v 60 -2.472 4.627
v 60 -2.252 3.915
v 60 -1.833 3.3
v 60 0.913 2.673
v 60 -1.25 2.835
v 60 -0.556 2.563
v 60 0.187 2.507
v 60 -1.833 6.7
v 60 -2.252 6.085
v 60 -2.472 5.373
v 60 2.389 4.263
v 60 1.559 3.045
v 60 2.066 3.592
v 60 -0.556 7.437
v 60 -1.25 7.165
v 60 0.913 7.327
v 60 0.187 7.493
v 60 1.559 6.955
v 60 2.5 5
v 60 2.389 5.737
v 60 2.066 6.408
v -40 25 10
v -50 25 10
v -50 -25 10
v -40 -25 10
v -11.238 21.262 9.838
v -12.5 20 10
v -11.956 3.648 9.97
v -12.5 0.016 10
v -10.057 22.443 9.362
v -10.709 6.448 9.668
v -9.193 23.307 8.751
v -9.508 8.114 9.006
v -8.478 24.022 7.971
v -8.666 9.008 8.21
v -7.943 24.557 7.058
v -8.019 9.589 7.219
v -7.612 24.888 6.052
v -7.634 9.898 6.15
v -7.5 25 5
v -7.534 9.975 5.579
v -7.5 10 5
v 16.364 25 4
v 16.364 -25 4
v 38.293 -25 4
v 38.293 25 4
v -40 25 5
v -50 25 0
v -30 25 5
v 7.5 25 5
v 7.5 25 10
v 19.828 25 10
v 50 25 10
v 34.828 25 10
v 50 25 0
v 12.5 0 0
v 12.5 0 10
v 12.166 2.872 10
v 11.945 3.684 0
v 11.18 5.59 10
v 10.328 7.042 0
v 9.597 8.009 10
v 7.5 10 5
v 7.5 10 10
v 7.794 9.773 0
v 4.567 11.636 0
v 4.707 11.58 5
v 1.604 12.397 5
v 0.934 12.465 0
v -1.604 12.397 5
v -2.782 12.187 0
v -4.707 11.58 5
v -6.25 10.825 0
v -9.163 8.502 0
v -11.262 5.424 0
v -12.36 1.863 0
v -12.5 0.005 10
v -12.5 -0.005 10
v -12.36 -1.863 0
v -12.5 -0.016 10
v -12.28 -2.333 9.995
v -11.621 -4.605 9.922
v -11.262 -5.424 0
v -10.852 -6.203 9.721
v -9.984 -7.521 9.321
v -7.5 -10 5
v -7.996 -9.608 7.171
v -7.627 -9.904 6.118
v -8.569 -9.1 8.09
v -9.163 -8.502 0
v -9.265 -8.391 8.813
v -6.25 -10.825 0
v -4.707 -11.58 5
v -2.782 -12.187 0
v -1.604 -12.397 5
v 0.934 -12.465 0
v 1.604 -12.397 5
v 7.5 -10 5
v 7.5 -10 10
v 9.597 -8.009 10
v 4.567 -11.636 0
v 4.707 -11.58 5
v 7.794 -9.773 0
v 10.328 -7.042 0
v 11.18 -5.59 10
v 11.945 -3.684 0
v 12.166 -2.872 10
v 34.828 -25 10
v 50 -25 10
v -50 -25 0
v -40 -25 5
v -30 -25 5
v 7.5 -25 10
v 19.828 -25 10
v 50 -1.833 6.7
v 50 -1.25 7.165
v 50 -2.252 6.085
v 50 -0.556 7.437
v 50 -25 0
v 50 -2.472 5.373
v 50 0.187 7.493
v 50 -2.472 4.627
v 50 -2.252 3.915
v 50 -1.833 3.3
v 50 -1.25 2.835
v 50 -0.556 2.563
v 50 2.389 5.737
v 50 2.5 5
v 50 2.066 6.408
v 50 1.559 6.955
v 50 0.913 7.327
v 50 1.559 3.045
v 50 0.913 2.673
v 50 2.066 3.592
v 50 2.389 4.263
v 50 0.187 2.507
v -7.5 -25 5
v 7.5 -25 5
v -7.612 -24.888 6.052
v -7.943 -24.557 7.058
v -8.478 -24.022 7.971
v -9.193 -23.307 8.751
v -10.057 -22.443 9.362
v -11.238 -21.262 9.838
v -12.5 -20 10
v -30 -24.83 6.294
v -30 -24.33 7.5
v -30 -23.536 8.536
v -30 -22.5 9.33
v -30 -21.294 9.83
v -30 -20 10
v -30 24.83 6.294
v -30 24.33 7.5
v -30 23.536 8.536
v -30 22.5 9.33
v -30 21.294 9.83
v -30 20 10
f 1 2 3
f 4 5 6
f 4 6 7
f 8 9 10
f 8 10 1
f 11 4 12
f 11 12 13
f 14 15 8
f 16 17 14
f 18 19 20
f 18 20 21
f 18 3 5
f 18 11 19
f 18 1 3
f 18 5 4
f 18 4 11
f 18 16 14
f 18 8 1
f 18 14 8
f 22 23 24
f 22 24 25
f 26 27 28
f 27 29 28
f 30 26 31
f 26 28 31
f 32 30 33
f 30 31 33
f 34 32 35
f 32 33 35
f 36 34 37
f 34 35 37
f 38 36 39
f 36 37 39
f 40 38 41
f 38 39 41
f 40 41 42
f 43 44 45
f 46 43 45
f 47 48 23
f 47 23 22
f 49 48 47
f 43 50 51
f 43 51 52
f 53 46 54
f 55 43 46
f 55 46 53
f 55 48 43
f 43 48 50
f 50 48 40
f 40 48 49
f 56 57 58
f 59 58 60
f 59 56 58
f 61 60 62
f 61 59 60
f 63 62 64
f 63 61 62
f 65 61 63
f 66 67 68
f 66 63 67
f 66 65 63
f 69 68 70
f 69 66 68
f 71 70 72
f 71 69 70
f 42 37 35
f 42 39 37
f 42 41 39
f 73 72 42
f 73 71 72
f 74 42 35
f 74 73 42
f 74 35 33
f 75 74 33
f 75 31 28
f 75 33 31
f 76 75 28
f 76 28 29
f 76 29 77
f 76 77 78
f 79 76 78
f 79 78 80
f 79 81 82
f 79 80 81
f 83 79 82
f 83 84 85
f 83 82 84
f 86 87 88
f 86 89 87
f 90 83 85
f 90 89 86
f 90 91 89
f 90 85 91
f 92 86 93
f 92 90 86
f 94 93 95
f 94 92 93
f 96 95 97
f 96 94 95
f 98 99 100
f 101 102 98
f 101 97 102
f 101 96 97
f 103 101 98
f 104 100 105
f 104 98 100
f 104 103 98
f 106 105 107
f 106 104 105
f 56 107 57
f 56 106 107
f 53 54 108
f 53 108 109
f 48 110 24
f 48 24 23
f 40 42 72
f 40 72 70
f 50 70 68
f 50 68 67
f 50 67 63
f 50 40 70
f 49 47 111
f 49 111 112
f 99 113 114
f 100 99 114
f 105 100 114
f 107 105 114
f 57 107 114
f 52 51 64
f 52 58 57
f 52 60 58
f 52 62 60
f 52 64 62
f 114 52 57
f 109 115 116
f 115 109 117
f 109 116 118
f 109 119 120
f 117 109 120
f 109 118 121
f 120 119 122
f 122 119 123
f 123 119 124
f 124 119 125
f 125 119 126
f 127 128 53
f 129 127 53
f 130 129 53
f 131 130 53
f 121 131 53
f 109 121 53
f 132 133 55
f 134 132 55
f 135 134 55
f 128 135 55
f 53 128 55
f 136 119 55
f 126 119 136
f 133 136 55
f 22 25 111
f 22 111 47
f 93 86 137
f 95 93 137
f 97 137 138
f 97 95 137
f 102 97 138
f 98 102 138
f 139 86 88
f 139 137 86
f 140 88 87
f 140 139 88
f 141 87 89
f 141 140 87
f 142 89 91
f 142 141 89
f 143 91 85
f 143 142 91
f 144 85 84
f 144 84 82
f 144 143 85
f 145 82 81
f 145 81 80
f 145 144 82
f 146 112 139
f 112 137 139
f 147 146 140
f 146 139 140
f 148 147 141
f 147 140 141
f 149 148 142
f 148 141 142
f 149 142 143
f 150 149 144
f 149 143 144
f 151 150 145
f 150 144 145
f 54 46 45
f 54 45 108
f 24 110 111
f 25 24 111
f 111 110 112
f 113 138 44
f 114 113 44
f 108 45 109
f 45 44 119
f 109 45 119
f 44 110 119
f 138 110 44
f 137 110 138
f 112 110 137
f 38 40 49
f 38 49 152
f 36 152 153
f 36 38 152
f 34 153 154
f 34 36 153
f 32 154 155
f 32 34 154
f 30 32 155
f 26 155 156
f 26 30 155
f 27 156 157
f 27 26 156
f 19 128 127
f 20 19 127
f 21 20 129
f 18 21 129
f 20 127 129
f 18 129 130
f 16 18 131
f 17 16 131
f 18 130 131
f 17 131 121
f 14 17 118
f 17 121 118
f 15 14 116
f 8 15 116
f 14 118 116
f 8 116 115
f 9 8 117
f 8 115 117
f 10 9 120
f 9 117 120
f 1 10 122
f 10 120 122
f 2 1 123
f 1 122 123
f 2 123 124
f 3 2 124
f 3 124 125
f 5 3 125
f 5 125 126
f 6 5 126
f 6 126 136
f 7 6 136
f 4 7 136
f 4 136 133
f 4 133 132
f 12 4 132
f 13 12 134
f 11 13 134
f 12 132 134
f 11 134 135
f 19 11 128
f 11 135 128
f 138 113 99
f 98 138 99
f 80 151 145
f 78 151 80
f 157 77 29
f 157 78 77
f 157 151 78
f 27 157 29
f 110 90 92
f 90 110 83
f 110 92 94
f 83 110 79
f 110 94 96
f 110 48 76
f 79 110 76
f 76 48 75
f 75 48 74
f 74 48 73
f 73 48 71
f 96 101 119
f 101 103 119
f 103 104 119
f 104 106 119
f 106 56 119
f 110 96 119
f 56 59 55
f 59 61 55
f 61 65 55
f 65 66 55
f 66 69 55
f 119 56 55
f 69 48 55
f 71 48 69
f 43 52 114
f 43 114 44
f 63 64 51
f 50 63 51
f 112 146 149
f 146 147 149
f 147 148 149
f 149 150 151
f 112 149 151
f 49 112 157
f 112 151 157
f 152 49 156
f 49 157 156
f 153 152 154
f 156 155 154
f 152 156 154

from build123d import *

# Parameters (mm, degrees)
F0_W     = 100
F0_H     = 50
F0_R     = 12.5
F1_DEPTH = 10
F2_W     = 10
F2_H     = 50
F3_DEPTH = 5
F5_DEPTH = 50.001
F6_R     = 2.5
F7_DEPTH = 10
F8_R     = 4.99999


# Not quite as in the source:
# - a fillet or chamfer is up to 0.001 mm smaller than in the source, because OpenCascade refuses the exact size


with BuildPart() as f1:
    # F0 (on Top) → F1 (new body)
    with BuildSketch(Plane.XY):
        Rectangle(F0_W, F0_H)
        Circle(F0_R, mode=Mode.SUBTRACT)
    extrude(amount=F1_DEPTH)

    # F2 (on face) → F3 (cut)
    with BuildSketch(Plane.XY.offset(10)):
        with Locations((-35, 0)):
            Rectangle(F2_W, F2_H)
        with BuildLine():
            Line((-7.5, -10), (-7.5, -25))
            Line((-7.5, -25), (7.5, -25))
            Line((7.5, -25), (7.5, -10))
            ThreePointArc((7.5, -10), (0, -12.5), (-7.5, -10))
        make_face()
        with BuildLine():
            Line((7.5, 25), (-7.5, 25))
            Line((-7.5, 25), (-7.5, 10))
            ThreePointArc((-7.5, 10), (0, 12.5), (7.5, 10))
            Line((7.5, 10), (7.5, 25))
        make_face()
    extrude(amount=-F3_DEPTH, mode=Mode.SUBTRACT)

    # F4 (on face) → F5 (cut, through all)
    with BuildSketch(Plane.XZ.offset(25)):
        Polygon((34.8284628647, 10), (19.8284628647, 10), (16.3643612496, 4), (38.2925644799, 4), align=None)
    extrude(amount=-F5_DEPTH, mode=Mode.SUBTRACT)

    # F6 (on face) → F7 (join)
    with BuildSketch(Plane.YZ.offset(50)):
        with Locations((0, 5)):
            Circle(F6_R)
    extrude(amount=F7_DEPTH)

    # F8 (radius 5 in the source; OpenCascade refuses exactly that, so slightly less here)
    f8_edges = [f1.edges().sort_by_distance(p)[0] for p in [
        (-18.75, -25, 10),
        (-18.75, 25, 10),
        (-7.5, -17.5, 10),
        (-7.5, 17.5, 10),
    ]]
    fillet(f8_edges, radius=F8_R)


solid = f1.part
